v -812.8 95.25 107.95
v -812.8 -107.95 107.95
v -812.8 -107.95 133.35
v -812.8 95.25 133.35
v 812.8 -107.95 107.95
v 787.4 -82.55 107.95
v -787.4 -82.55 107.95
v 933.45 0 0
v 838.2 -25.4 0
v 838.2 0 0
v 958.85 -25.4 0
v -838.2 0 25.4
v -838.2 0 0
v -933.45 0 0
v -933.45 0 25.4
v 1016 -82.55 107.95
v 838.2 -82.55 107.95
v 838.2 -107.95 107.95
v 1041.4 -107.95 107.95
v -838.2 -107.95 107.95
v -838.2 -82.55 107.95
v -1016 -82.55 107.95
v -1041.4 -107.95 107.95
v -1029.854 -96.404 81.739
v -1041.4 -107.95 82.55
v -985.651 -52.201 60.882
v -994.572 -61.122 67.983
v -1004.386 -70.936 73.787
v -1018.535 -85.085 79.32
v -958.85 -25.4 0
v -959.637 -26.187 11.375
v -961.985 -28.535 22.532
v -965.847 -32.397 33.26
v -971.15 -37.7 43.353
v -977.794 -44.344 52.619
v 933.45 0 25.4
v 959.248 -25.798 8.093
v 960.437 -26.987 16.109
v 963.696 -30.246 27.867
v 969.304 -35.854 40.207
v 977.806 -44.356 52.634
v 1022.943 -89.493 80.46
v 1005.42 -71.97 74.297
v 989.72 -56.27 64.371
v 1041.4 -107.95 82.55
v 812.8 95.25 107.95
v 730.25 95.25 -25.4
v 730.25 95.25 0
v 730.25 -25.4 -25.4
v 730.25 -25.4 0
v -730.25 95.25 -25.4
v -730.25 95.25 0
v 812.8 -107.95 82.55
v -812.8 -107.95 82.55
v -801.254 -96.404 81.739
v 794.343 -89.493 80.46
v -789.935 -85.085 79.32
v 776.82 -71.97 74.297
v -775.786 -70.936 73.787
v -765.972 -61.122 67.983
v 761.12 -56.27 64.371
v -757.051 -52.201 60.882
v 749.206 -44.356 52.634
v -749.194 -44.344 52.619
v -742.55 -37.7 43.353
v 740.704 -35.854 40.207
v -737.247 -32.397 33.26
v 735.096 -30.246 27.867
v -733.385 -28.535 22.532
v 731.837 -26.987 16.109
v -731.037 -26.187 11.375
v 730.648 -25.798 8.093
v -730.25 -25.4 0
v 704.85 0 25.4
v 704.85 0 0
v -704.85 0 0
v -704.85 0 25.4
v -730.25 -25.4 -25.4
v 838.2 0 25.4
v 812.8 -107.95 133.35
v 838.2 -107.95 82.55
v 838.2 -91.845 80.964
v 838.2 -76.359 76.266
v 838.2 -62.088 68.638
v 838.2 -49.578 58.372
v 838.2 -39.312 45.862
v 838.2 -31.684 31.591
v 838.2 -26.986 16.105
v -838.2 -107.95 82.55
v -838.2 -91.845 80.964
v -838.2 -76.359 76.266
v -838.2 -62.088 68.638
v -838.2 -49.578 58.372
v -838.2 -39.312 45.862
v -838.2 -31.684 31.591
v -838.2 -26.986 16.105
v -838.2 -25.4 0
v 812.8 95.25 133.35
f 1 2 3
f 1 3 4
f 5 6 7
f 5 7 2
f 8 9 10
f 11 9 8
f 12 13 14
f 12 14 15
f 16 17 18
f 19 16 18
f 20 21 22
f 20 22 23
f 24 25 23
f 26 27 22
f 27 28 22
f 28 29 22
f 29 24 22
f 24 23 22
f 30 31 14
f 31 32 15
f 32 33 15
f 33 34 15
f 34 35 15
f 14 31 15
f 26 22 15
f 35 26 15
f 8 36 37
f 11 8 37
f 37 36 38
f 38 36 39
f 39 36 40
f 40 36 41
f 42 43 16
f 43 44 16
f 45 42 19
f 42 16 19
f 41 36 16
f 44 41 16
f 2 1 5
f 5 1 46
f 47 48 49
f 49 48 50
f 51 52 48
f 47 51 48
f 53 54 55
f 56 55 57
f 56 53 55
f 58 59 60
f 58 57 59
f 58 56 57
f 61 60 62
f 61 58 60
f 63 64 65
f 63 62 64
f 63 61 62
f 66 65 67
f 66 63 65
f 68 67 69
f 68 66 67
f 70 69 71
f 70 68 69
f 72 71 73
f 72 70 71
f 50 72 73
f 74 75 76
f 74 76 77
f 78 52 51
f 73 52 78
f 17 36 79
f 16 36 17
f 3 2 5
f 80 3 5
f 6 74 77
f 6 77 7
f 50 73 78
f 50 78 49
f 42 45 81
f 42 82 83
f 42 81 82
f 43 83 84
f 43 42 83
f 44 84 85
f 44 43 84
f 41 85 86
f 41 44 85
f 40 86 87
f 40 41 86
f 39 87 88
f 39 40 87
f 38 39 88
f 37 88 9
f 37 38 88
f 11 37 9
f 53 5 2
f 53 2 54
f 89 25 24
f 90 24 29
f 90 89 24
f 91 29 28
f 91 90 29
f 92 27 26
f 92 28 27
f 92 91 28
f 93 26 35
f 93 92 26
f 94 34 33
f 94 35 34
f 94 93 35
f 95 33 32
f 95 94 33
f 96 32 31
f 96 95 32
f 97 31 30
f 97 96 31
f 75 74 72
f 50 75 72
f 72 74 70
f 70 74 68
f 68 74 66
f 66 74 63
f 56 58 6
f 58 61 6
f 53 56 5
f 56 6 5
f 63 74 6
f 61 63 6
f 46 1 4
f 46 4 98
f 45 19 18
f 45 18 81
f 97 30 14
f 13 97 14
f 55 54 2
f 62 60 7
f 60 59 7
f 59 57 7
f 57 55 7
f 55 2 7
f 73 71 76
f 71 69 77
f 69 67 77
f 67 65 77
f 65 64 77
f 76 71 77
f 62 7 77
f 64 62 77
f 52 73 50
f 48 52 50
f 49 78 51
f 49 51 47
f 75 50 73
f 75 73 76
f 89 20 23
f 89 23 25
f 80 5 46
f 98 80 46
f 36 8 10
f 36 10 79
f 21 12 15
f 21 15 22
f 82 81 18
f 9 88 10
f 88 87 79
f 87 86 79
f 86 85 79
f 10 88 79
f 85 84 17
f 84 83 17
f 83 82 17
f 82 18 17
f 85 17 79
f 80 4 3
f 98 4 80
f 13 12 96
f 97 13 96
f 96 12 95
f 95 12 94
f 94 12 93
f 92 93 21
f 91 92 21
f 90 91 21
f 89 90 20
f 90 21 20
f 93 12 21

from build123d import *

# Parameters (mm, degrees)
F1_DEPTH = 1041.4
F3_DEPTH = 107.951
F4_W     = 1460.5
F4_H     = 120.65
F5_DEPTH = 25.4
F6_W     = 1625.6
F6_H     = 203.2
F7_DEPTH = 25.4


with BuildPart() as f1:
    # F0 (on Right) → F1 (new body, symmetric)
    with BuildSketch(Plane.YZ):
        with BuildLine():
            Line((-25.4, 0), (0, 0))
            Line((0, 0), (0, 25.4))
            Line((0, 25.4), (-82.55, 107.95))
            Line((-82.55, 107.95), (-107.95, 107.95))
            Line((-107.95, 107.95), (-107.95, 82.55))
            ThreePointArc((-107.95, 82.55), (-49.578335, 58.371665), (-25.4, 0))
        make_face()
    extrude(amount=F1_DEPTH, both=True)

    # F2 (on face) → F3 (cut, through all)
    with BuildSketch(Plane.XY.offset(107.95)):
        Polygon((-1041.4, 0), (-1041.4, -107.95), (-933.45, 0), align=None)
        Polygon((933.45, 0), (1041.4, -107.95), (1041.4, 0), align=None)
        Polygon((-704.85, 0), (-838.2, 0), (-838.2, -107.95), (-812.8, -107.95), align=None)
        Polygon((838.2, -107.95), (838.2, 0), (704.85, 0), (812.8, -107.95), align=None)
    extrude(amount=-F3_DEPTH, mode=Mode.SUBTRACT)


with BuildPart() as f5:
    # F4 (on face) → F5 (new body)
    with BuildSketch(Plane(origin=(0, 0, 0), x_dir=(1, 0, 0), z_dir=(0, 0, -1))):
        with Locations((0, -34.925)):
            Rectangle(F4_W, F4_H)
    extrude(amount=F5_DEPTH)


with BuildPart() as f7:
    # F6 (on face) → F7 (new body)
    with BuildSketch(Plane.XY.offset(107.95)):
        with Locations((0, -6.35)):
            Rectangle(F6_W, F6_H)
    extrude(amount=F7_DEPTH)


solid = Compound([f1.part, f5.part, f7.part])
